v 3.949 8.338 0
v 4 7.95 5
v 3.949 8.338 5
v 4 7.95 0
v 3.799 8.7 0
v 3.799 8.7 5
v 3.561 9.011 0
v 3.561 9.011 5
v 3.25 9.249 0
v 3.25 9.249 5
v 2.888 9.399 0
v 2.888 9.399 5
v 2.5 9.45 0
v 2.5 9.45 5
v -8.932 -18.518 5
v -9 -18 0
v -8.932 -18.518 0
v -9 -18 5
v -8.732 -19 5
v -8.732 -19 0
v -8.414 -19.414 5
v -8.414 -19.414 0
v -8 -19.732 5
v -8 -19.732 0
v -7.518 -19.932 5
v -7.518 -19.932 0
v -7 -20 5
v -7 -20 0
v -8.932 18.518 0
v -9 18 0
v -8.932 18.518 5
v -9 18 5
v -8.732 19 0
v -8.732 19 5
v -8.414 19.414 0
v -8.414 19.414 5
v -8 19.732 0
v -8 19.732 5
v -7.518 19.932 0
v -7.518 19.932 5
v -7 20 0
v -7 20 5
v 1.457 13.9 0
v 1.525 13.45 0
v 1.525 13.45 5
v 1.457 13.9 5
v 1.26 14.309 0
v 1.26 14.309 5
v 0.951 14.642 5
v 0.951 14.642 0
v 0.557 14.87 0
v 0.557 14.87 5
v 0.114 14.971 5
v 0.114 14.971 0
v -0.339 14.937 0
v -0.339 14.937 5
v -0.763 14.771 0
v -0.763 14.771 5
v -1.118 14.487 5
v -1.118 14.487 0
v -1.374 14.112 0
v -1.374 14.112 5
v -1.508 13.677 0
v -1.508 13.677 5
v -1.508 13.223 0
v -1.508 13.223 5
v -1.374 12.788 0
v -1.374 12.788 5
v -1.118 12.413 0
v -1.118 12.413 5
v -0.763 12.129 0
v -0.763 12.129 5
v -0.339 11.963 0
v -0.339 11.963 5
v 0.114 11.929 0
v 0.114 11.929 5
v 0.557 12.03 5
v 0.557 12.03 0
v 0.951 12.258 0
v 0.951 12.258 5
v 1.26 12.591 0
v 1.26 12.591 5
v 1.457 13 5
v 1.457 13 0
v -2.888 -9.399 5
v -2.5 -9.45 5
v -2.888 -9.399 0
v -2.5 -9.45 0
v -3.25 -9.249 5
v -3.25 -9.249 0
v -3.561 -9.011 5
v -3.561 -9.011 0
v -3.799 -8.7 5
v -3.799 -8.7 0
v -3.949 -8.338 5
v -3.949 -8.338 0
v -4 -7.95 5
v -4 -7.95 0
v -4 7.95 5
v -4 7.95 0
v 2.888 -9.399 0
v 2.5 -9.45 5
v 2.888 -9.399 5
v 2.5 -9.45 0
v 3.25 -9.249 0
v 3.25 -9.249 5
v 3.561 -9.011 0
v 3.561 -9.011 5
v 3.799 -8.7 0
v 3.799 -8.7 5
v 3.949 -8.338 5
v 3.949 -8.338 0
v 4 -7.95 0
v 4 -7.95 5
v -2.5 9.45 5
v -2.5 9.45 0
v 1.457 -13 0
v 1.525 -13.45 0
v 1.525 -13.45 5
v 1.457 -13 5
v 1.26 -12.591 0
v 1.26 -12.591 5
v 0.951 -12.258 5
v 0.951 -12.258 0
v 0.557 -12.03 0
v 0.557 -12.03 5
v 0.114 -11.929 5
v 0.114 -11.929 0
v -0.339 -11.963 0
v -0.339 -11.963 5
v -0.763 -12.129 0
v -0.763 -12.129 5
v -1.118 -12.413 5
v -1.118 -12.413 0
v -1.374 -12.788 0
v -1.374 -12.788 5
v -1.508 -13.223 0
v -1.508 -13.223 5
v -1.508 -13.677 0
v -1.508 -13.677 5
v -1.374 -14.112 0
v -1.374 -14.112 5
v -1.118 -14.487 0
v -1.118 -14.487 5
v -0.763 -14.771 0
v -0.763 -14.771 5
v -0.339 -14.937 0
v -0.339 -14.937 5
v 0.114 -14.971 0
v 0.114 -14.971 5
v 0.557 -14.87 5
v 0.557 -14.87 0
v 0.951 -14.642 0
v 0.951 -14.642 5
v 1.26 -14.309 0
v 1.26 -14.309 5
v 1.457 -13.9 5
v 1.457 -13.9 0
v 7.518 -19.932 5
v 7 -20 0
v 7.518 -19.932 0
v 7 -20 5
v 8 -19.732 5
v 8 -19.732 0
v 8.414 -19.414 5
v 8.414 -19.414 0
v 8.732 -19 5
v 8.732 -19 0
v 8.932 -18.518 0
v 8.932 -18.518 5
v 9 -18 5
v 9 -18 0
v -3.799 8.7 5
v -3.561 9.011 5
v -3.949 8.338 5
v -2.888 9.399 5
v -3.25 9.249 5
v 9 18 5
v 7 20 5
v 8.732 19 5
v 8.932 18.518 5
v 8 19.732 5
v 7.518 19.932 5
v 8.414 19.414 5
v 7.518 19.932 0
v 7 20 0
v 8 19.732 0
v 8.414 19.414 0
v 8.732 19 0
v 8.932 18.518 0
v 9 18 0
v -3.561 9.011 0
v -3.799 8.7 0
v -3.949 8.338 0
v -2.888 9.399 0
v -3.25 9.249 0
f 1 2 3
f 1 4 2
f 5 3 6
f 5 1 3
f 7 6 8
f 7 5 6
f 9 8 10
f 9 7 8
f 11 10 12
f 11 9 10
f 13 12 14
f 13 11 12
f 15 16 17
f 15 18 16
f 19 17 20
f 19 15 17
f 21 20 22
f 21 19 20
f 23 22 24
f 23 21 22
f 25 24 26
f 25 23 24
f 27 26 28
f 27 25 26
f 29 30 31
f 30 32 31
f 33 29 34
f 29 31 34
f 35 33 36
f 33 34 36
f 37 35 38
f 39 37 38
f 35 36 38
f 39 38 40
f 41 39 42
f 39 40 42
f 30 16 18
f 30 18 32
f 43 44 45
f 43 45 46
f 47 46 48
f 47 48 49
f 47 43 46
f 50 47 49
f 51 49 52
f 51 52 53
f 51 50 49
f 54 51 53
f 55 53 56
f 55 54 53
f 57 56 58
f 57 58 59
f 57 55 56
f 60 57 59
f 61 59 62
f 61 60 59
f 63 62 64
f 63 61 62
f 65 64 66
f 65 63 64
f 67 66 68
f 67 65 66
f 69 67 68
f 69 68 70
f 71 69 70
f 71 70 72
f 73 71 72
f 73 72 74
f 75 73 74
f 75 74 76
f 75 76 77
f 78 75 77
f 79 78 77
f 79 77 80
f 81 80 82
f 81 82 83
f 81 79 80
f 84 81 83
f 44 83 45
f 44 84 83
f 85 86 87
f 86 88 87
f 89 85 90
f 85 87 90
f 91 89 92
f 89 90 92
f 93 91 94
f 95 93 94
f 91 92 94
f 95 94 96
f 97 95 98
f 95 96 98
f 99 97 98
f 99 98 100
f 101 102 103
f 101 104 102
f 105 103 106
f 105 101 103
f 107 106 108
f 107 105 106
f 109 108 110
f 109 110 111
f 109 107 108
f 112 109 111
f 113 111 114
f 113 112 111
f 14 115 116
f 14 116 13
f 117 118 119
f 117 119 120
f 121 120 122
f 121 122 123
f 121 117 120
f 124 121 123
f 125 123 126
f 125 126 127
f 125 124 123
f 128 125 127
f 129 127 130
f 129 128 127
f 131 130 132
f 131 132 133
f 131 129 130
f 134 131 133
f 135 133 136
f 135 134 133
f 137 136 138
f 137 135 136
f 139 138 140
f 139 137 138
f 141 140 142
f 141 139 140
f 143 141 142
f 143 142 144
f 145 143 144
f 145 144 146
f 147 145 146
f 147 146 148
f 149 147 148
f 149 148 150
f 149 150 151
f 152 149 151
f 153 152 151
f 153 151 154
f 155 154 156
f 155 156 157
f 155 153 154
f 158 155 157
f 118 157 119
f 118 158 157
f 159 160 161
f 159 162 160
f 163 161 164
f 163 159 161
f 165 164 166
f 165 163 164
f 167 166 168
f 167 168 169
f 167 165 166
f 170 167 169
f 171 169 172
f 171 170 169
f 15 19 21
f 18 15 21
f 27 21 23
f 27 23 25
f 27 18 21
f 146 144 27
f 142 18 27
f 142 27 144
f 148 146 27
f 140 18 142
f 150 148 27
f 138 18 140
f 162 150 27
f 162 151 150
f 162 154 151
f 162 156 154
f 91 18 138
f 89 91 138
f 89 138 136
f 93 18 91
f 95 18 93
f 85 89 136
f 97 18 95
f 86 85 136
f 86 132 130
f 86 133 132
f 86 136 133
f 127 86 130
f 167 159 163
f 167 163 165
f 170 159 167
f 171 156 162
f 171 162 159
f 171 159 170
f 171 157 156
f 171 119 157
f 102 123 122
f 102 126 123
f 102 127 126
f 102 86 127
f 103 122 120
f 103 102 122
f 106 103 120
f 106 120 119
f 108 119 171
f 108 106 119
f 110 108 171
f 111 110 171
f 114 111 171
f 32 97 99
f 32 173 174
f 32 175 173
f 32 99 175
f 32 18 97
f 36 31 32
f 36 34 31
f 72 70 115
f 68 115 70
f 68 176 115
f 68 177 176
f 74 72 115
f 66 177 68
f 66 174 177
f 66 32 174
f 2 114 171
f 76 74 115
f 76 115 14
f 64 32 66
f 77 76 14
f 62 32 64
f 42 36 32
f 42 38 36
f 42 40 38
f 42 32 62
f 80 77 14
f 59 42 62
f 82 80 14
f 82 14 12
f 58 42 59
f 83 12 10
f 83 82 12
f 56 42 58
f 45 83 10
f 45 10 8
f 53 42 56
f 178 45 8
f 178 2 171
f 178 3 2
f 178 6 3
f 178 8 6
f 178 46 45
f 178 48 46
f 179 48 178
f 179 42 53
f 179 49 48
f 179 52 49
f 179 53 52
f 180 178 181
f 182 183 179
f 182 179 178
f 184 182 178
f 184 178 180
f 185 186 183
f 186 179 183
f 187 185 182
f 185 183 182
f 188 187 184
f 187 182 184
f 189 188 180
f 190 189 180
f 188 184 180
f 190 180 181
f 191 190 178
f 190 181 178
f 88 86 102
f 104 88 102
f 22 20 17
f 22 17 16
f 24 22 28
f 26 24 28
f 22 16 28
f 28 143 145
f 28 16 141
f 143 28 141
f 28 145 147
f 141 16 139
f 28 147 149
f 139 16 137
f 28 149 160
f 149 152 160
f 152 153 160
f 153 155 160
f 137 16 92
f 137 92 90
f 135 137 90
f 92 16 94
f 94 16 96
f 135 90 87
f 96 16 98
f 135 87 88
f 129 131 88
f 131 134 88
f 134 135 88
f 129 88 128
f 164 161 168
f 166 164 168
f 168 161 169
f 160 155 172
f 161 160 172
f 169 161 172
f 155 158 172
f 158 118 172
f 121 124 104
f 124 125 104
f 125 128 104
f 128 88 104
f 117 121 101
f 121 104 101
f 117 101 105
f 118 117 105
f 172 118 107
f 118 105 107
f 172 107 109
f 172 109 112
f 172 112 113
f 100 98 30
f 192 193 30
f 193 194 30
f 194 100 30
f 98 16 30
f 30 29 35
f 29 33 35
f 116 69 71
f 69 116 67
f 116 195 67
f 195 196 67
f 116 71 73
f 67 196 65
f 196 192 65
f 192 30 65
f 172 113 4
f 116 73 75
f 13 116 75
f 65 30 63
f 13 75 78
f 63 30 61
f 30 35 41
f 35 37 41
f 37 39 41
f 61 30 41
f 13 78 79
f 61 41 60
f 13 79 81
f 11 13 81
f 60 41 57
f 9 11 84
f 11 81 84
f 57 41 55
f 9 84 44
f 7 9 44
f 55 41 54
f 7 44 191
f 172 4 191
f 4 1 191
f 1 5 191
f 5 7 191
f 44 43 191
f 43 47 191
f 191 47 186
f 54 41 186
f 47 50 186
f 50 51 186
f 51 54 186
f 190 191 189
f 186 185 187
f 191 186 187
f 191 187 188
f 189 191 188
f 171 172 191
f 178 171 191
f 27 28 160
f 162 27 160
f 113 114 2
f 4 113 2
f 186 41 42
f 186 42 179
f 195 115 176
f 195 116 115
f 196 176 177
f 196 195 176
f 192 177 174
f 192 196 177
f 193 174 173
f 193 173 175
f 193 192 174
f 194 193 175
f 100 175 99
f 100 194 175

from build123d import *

# Parameters (mm, degrees)
SKETCH_1_W          = 18
SKETCH_1_H          = 40
SKETCH_1_R          = 1.525
EXTRUDE_1_DEPTH     = 5
FILLET_1_R          = 2
SKETCH_2_W          = 8
SKETCH_2_H          = 18.9
CUT_EXTRUDE_1_DEPTH = 5
FILLET_2_R          = 1.5


with BuildPart() as part:
    # 草图1 → 凸台-拉伸1 (new body)
    with BuildSketch(Plane.XY):
        Rectangle(SKETCH_1_W, SKETCH_1_H)
        with Locations((0, 13.45)):
            Circle(SKETCH_1_R, mode=Mode.SUBTRACT)
        with Locations((0, -13.45)):
            Circle(SKETCH_1_R, mode=Mode.SUBTRACT)
    extrude(amount=EXTRUDE_1_DEPTH)

    # 圆角1
    fillet_1_edges = [part.edges().sort_by_distance(p)[0] for p in [
        (9, -20, 2.5),
        (-9, -20, 2.5),
        (-9, 20, 2.5),
        (9, 20, 2.5),
    ]]
    fillet(fillet_1_edges, radius=FILLET_1_R)

    # 草图2 → 切除-拉伸1 (cut)
    with BuildSketch(Plane.XY.offset(5)):
        Rectangle(SKETCH_2_W, SKETCH_2_H)
    extrude(amount=-CUT_EXTRUDE_1_DEPTH, mode=Mode.SUBTRACT)

    # 圆角2
    fillet_2_edges = [part.edges().sort_by_distance(p)[0] for p in [
        (4, 9.45, 2.5),
        (4, -9.45, 2.5),
        (-4, -9.45, 2.5),
        (-4, 9.45, 2.5),
    ]]
    fillet(fillet_2_edges, radius=FILLET_2_R)


solid = part.part
